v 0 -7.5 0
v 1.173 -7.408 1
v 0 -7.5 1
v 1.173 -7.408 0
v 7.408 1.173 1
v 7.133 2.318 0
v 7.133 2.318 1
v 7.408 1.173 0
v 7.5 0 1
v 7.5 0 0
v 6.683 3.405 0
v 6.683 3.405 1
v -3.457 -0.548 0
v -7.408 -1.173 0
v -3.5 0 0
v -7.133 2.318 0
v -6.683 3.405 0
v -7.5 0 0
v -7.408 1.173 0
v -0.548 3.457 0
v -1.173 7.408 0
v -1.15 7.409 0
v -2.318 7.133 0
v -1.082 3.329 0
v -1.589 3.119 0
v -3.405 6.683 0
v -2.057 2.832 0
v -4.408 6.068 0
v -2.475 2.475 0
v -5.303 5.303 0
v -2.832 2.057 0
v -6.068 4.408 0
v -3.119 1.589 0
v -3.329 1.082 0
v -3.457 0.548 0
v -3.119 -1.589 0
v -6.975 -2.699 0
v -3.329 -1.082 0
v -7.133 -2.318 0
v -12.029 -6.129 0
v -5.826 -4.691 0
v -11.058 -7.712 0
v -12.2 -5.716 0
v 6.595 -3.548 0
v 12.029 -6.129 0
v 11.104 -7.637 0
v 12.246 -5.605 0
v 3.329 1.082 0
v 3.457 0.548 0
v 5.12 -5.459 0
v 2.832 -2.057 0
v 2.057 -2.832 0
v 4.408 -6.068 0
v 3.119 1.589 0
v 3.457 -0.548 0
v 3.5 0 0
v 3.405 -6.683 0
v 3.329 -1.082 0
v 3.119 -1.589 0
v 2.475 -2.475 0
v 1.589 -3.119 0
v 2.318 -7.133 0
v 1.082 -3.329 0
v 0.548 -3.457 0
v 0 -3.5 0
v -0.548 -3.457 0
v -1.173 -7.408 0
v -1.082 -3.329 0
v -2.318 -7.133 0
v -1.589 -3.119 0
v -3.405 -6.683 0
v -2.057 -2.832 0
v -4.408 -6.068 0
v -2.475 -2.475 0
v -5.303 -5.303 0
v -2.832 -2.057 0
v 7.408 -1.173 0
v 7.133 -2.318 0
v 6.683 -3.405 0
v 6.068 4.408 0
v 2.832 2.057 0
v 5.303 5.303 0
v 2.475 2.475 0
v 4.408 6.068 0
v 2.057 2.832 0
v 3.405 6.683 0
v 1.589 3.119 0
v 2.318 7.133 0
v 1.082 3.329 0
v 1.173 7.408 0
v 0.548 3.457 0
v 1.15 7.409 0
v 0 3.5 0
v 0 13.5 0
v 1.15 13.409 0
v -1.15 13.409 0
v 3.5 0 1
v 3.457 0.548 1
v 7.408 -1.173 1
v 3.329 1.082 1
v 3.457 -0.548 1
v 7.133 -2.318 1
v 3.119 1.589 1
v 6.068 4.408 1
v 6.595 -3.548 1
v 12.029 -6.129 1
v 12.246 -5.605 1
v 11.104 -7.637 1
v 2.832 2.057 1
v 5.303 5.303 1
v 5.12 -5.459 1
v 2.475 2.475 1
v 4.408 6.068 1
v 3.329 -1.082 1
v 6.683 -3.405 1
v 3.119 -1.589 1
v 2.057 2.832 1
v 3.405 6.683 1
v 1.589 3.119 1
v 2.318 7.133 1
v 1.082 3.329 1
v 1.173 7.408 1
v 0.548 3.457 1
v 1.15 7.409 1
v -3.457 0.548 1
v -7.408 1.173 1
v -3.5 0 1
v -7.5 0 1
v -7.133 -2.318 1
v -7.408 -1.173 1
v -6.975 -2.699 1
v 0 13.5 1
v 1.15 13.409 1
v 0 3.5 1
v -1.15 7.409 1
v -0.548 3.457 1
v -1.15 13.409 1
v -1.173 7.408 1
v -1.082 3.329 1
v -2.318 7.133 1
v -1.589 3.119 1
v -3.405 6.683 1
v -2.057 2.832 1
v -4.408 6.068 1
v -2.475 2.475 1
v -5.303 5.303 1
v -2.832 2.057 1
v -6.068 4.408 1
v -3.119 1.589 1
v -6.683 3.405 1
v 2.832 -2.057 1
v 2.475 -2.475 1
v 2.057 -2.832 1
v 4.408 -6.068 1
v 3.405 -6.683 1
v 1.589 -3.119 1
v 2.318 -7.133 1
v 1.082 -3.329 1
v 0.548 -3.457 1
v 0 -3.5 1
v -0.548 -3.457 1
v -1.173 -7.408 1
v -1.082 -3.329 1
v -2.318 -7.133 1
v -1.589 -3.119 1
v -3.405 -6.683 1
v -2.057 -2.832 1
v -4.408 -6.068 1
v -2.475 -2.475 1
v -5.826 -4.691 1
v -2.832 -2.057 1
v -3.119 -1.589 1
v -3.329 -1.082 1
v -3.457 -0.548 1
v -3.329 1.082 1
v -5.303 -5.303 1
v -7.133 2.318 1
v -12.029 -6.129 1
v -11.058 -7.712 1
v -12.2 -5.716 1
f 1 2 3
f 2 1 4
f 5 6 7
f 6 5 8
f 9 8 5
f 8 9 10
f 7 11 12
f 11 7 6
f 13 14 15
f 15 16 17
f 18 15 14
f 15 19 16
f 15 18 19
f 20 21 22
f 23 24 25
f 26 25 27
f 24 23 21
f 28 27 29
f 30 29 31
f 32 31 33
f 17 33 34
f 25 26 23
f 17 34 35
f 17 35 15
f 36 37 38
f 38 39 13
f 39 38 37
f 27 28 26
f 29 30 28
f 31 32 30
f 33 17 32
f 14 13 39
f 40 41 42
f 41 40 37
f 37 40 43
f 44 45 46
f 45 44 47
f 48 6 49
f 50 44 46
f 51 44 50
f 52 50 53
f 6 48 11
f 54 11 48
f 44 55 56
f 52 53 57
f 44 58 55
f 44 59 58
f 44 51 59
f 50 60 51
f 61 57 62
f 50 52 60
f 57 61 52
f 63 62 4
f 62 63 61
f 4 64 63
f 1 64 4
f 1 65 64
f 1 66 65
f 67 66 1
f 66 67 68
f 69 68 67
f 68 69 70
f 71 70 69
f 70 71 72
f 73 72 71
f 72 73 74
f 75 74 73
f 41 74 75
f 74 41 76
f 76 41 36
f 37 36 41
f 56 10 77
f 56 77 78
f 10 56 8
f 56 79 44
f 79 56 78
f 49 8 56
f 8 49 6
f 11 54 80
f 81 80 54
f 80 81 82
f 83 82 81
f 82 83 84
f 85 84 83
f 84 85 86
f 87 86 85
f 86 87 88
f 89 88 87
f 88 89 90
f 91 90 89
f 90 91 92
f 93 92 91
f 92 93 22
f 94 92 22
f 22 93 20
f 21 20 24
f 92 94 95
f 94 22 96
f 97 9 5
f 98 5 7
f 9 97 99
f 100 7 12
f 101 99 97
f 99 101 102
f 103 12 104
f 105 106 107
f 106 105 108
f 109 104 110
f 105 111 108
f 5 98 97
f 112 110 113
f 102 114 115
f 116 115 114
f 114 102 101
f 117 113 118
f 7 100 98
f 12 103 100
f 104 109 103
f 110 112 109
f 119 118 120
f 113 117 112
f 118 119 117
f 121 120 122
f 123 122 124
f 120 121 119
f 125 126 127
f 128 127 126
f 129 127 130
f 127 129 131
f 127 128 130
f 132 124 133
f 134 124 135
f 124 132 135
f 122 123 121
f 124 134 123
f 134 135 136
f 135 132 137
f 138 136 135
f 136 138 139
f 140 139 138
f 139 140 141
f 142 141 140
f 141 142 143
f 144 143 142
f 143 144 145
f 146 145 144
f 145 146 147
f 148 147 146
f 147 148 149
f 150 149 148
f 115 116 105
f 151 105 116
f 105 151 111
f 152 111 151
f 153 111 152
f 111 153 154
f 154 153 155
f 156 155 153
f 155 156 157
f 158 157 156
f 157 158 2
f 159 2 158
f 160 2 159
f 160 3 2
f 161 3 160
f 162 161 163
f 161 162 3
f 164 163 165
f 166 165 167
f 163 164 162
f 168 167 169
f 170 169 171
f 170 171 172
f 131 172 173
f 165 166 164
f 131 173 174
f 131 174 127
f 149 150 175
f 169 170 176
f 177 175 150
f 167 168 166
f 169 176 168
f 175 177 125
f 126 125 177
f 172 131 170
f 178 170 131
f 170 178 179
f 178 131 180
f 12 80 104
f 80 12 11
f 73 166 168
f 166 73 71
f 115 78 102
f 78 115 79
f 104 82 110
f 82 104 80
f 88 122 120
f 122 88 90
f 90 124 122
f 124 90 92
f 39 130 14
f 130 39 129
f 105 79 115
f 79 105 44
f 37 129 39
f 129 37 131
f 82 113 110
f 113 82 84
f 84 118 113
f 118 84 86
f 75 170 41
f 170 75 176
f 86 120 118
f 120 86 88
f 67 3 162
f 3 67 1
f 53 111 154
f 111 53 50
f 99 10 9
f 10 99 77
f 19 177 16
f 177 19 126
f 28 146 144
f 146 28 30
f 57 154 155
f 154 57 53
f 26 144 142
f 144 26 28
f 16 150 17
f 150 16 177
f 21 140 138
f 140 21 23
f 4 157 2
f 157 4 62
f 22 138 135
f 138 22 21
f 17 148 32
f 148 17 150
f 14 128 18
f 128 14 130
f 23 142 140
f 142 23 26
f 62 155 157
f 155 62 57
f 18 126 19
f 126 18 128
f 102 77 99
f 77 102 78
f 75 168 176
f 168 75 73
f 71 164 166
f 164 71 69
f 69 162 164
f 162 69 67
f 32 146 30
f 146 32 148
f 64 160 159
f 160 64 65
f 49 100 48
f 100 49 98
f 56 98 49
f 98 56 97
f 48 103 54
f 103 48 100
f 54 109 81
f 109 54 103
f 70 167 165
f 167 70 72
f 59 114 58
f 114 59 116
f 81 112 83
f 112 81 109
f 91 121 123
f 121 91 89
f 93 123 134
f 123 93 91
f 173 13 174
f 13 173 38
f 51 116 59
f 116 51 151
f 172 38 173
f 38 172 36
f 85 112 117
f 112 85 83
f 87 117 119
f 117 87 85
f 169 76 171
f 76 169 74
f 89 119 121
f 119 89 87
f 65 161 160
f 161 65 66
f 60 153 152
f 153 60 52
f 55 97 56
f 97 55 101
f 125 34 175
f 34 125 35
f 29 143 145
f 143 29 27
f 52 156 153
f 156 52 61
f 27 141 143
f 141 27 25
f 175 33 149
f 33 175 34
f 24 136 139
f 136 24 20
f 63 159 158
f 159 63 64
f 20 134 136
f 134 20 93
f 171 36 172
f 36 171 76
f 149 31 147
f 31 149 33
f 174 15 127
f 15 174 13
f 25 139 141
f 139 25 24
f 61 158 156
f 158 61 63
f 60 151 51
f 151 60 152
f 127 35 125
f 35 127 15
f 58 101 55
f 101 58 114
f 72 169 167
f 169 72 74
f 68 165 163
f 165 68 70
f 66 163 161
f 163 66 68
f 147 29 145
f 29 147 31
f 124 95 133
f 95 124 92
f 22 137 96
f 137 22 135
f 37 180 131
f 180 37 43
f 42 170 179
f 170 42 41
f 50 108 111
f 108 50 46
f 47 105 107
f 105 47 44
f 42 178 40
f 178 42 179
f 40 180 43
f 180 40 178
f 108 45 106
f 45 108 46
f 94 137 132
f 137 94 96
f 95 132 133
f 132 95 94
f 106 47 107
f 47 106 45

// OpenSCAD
$fn = 40;

intersection() {
    union() {
        difference() {
            cylinder(d=15, h=1);
            cylinder(d=7, h=2);
        }

        #translate([0,10,1/2]) cube([2.3, 8, 1],center=true);
        rotate([0,0,360/3]) translate([0,10,1/2]) cube([2.3, 8, 1],center=true);
        rotate([0,0,360/3*2]) translate([0.5,10,1/2]) rotate([0,0,10]) cube([2.3, 8, 1],center=true);
    }
    cylinder(d=27, h=2);
}
